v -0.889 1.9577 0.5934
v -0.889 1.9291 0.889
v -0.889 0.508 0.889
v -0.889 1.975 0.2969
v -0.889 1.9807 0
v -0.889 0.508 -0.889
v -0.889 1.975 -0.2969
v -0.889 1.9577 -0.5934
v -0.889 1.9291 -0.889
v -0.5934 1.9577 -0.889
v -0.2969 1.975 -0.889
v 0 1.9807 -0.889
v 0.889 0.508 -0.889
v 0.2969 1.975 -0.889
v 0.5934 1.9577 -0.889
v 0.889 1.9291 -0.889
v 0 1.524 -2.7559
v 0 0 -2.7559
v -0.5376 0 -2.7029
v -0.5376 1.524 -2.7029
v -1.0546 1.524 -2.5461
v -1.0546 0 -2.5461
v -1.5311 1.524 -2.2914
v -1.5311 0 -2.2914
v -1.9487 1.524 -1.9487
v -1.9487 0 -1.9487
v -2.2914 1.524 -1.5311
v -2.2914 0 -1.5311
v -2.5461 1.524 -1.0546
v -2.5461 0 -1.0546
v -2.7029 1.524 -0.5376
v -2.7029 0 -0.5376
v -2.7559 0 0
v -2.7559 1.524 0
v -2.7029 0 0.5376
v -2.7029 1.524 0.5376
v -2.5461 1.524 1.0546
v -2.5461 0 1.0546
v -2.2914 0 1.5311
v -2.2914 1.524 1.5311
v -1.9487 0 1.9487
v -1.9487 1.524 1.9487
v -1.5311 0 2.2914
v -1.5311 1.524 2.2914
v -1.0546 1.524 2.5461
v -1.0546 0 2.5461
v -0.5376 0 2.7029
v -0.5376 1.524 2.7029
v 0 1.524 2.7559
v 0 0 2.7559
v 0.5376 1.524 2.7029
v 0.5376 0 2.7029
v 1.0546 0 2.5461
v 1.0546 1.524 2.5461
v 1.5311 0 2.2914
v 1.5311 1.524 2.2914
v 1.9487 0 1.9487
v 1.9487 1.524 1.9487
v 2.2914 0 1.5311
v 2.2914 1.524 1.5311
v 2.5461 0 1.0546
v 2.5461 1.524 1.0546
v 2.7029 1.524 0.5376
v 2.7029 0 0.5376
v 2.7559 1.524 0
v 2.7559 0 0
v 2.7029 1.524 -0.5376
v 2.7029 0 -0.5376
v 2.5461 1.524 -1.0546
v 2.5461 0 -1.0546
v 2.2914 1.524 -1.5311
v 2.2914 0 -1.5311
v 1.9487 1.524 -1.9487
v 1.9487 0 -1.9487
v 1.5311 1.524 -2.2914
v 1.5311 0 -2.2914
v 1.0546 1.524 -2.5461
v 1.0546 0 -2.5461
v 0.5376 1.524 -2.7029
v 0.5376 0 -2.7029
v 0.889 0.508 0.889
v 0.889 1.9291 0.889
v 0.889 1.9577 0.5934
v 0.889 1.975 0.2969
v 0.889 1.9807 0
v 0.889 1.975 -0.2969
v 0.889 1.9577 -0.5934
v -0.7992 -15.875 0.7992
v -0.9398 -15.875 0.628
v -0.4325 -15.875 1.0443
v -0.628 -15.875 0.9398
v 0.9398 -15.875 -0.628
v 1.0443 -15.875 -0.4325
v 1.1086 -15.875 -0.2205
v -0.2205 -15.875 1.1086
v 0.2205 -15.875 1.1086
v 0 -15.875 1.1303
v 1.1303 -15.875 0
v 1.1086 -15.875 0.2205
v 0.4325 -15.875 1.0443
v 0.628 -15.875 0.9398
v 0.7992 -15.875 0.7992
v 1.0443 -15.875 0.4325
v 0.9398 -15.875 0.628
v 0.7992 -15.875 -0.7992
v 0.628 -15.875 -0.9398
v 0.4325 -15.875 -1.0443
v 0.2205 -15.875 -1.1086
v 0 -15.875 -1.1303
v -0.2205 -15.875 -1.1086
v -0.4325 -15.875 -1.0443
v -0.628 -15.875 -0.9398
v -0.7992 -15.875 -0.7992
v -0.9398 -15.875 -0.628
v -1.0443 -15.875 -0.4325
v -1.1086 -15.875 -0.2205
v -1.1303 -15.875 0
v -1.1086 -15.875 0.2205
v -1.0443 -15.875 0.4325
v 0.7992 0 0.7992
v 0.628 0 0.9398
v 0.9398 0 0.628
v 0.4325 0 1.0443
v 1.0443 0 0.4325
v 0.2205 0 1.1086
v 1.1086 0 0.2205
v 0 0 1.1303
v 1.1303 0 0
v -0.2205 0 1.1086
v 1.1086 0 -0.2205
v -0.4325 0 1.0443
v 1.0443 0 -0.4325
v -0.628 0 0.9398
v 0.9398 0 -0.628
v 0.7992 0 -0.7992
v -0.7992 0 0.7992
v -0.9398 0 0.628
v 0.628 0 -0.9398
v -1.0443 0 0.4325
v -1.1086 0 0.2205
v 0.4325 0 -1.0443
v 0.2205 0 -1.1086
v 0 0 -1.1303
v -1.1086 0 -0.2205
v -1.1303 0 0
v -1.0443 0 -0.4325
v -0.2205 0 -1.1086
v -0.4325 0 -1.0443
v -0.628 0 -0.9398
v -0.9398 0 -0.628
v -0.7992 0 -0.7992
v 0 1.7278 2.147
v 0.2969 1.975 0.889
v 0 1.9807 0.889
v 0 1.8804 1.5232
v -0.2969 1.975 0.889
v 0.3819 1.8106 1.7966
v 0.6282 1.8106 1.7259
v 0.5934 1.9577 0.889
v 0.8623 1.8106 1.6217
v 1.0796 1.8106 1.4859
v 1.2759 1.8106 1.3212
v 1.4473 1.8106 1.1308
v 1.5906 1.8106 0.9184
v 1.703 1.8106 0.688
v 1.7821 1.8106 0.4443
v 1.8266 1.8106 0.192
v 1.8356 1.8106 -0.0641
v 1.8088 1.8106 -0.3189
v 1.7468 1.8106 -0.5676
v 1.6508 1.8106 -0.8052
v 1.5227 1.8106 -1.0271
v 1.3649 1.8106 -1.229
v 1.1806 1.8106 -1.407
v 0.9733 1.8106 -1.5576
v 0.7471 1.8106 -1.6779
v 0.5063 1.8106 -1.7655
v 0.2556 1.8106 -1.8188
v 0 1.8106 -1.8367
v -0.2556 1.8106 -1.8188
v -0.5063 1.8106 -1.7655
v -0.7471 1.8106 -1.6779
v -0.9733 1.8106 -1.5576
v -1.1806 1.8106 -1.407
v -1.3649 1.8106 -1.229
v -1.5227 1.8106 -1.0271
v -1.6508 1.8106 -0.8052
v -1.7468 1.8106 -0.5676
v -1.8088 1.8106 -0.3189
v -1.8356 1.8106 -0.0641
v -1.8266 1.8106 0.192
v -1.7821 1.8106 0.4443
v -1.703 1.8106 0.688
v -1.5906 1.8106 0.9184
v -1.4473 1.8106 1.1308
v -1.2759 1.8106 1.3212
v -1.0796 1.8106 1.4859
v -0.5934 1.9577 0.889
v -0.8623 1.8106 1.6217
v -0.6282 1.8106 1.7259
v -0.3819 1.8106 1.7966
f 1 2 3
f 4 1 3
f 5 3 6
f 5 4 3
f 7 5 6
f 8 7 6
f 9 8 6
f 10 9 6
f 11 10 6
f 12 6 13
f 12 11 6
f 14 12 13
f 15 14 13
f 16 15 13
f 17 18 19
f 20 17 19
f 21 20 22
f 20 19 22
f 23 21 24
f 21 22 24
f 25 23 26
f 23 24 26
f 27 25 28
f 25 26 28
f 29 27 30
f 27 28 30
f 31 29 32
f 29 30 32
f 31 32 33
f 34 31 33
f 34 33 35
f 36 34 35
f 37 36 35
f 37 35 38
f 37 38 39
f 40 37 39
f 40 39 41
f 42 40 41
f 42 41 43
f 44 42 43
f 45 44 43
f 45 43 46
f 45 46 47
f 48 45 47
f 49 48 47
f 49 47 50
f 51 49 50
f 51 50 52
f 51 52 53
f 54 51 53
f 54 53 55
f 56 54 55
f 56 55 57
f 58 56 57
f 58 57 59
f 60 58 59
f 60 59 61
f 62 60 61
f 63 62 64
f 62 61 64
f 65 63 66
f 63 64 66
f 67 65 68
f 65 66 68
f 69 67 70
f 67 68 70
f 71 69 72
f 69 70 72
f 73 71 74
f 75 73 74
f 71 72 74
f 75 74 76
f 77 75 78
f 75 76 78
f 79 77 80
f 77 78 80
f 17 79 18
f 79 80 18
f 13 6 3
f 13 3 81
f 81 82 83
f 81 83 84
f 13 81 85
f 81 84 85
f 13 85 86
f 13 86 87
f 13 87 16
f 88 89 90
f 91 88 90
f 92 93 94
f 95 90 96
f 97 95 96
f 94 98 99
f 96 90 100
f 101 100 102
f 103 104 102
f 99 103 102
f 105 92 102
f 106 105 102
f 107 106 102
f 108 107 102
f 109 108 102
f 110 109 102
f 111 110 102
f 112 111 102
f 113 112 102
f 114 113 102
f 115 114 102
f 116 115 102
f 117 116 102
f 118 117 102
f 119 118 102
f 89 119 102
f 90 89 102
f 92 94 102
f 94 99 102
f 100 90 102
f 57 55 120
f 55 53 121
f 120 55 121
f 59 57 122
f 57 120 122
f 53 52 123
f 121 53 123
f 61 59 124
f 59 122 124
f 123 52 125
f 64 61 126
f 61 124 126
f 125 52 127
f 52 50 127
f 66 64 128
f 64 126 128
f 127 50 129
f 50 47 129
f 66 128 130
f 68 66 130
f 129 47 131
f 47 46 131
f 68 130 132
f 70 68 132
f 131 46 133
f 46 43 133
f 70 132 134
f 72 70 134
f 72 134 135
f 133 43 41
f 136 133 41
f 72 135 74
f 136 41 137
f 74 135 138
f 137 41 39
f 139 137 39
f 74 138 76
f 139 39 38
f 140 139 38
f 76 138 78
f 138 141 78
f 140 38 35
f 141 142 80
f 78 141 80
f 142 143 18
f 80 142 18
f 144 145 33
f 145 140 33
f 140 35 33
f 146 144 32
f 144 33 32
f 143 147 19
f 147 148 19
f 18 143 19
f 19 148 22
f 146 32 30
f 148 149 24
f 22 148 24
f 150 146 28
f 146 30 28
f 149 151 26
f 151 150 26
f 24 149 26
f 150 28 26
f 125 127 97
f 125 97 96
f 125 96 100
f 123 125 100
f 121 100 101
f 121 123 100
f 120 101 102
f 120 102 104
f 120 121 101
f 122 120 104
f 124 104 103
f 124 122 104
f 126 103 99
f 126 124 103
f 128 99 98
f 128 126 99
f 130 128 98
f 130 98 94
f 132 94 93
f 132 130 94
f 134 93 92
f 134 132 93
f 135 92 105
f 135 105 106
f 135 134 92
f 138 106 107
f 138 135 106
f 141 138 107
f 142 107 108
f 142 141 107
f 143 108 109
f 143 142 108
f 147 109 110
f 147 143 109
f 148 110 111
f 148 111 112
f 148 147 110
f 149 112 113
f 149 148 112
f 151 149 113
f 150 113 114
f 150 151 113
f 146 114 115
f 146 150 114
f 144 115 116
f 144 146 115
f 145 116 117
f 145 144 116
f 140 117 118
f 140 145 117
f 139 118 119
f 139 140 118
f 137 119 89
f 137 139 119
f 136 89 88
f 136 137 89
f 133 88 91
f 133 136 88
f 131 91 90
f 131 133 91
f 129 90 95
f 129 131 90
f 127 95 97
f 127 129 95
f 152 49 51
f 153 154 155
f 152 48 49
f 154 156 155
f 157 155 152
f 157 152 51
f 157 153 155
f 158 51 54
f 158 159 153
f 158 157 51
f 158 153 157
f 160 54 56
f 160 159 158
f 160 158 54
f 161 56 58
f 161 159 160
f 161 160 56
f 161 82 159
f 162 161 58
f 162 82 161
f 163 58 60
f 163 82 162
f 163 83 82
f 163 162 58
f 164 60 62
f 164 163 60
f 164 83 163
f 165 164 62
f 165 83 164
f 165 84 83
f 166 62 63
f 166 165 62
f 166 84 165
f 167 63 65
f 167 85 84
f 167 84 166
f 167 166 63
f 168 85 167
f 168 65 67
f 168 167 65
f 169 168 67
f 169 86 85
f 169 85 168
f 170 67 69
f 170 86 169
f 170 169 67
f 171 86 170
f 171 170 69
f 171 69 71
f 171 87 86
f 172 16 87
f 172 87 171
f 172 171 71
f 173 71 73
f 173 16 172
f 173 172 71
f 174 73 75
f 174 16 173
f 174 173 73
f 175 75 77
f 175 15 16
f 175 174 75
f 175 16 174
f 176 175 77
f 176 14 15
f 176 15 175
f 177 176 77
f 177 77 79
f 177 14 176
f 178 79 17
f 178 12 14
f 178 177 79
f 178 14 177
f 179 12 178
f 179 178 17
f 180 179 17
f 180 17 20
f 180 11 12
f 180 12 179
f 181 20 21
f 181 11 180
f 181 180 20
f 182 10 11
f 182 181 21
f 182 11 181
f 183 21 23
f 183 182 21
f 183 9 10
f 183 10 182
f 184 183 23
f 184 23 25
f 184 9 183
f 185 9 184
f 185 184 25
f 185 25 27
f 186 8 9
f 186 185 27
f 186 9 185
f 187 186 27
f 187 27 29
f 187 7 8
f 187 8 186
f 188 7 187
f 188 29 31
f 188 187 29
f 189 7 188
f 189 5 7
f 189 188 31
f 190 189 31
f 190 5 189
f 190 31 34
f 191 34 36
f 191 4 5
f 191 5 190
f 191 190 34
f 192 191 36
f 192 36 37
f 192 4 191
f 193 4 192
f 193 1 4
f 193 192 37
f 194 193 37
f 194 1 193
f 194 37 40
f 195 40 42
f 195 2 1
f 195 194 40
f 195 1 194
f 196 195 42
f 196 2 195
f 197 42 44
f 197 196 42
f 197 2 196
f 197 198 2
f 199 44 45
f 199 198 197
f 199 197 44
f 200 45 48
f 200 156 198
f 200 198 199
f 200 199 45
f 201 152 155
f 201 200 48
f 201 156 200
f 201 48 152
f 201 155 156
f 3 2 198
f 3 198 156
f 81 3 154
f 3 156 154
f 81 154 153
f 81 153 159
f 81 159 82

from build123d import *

# Parameters (mm, degrees)
SKETCH1_R            = 1.1303
THREADS_DEPTH        = 15.875
SKETCH2_R            = 2.7559
HEAD_DEPTH           = 1.524
HEADDOME_FACE_RADIUS = 2.7559
HEADDOME_HEIGHT      = 0.508
SKETCH3_W            = 1.778
SKETCH3_H            = 1.778
DRIVER_DEPTH         = 1.524


with BuildPart() as part:
    # Sketch1 → threads (new body)
    with BuildSketch(Plane(origin=(0, 0, 0), x_dir=(1, 0, 0), z_dir=(0, 1, 0))):
        with Locations(Location((0, 0, 0), (0, 0, 270))):
            Circle(SKETCH1_R)
    extrude(amount=-THREADS_DEPTH)

    # Sketch2 → Head (add)
    with BuildSketch(Plane(origin=(0, 0, 0), x_dir=(1, 0, 0), z_dir=(0, 1, 0))):
        with Locations(Location((0, 0, 0), (0, 0, 90))):
            Circle(SKETCH2_R)
    extrude(amount=HEAD_DEPTH)

    # HeadDome: a dome of height H over a round flat face of radius A is a cap of a sphere of radius (A * A + H * H) / (2 * H)
    headdome_r = (HEADDOME_FACE_RADIUS * HEADDOME_FACE_RADIUS + HEADDOME_HEIGHT * HEADDOME_HEIGHT) / (2 * HEADDOME_HEIGHT)
    headdome_base = Plane((0, 1.524, 0), z_dir=(0, 1, 0))
    with Locations(headdome_base.offset(HEADDOME_HEIGHT - headdome_r)):
        headdome_ball = Sphere(headdome_r, mode=Mode.PRIVATE)
    add(split(headdome_ball, bisect_by=headdome_base, keep=Keep.TOP, mode=Mode.PRIVATE))

    # Sketch3 → Driver (cut)
    with BuildSketch(Plane(origin=(0, 2.032, 0), x_dir=(1, 0, 0), z_dir=(0, 1, 0))):
        Rectangle(SKETCH3_W, SKETCH3_H)
    extrude(amount=-DRIVER_DEPTH, mode=Mode.SUBTRACT)


solid = part.part
